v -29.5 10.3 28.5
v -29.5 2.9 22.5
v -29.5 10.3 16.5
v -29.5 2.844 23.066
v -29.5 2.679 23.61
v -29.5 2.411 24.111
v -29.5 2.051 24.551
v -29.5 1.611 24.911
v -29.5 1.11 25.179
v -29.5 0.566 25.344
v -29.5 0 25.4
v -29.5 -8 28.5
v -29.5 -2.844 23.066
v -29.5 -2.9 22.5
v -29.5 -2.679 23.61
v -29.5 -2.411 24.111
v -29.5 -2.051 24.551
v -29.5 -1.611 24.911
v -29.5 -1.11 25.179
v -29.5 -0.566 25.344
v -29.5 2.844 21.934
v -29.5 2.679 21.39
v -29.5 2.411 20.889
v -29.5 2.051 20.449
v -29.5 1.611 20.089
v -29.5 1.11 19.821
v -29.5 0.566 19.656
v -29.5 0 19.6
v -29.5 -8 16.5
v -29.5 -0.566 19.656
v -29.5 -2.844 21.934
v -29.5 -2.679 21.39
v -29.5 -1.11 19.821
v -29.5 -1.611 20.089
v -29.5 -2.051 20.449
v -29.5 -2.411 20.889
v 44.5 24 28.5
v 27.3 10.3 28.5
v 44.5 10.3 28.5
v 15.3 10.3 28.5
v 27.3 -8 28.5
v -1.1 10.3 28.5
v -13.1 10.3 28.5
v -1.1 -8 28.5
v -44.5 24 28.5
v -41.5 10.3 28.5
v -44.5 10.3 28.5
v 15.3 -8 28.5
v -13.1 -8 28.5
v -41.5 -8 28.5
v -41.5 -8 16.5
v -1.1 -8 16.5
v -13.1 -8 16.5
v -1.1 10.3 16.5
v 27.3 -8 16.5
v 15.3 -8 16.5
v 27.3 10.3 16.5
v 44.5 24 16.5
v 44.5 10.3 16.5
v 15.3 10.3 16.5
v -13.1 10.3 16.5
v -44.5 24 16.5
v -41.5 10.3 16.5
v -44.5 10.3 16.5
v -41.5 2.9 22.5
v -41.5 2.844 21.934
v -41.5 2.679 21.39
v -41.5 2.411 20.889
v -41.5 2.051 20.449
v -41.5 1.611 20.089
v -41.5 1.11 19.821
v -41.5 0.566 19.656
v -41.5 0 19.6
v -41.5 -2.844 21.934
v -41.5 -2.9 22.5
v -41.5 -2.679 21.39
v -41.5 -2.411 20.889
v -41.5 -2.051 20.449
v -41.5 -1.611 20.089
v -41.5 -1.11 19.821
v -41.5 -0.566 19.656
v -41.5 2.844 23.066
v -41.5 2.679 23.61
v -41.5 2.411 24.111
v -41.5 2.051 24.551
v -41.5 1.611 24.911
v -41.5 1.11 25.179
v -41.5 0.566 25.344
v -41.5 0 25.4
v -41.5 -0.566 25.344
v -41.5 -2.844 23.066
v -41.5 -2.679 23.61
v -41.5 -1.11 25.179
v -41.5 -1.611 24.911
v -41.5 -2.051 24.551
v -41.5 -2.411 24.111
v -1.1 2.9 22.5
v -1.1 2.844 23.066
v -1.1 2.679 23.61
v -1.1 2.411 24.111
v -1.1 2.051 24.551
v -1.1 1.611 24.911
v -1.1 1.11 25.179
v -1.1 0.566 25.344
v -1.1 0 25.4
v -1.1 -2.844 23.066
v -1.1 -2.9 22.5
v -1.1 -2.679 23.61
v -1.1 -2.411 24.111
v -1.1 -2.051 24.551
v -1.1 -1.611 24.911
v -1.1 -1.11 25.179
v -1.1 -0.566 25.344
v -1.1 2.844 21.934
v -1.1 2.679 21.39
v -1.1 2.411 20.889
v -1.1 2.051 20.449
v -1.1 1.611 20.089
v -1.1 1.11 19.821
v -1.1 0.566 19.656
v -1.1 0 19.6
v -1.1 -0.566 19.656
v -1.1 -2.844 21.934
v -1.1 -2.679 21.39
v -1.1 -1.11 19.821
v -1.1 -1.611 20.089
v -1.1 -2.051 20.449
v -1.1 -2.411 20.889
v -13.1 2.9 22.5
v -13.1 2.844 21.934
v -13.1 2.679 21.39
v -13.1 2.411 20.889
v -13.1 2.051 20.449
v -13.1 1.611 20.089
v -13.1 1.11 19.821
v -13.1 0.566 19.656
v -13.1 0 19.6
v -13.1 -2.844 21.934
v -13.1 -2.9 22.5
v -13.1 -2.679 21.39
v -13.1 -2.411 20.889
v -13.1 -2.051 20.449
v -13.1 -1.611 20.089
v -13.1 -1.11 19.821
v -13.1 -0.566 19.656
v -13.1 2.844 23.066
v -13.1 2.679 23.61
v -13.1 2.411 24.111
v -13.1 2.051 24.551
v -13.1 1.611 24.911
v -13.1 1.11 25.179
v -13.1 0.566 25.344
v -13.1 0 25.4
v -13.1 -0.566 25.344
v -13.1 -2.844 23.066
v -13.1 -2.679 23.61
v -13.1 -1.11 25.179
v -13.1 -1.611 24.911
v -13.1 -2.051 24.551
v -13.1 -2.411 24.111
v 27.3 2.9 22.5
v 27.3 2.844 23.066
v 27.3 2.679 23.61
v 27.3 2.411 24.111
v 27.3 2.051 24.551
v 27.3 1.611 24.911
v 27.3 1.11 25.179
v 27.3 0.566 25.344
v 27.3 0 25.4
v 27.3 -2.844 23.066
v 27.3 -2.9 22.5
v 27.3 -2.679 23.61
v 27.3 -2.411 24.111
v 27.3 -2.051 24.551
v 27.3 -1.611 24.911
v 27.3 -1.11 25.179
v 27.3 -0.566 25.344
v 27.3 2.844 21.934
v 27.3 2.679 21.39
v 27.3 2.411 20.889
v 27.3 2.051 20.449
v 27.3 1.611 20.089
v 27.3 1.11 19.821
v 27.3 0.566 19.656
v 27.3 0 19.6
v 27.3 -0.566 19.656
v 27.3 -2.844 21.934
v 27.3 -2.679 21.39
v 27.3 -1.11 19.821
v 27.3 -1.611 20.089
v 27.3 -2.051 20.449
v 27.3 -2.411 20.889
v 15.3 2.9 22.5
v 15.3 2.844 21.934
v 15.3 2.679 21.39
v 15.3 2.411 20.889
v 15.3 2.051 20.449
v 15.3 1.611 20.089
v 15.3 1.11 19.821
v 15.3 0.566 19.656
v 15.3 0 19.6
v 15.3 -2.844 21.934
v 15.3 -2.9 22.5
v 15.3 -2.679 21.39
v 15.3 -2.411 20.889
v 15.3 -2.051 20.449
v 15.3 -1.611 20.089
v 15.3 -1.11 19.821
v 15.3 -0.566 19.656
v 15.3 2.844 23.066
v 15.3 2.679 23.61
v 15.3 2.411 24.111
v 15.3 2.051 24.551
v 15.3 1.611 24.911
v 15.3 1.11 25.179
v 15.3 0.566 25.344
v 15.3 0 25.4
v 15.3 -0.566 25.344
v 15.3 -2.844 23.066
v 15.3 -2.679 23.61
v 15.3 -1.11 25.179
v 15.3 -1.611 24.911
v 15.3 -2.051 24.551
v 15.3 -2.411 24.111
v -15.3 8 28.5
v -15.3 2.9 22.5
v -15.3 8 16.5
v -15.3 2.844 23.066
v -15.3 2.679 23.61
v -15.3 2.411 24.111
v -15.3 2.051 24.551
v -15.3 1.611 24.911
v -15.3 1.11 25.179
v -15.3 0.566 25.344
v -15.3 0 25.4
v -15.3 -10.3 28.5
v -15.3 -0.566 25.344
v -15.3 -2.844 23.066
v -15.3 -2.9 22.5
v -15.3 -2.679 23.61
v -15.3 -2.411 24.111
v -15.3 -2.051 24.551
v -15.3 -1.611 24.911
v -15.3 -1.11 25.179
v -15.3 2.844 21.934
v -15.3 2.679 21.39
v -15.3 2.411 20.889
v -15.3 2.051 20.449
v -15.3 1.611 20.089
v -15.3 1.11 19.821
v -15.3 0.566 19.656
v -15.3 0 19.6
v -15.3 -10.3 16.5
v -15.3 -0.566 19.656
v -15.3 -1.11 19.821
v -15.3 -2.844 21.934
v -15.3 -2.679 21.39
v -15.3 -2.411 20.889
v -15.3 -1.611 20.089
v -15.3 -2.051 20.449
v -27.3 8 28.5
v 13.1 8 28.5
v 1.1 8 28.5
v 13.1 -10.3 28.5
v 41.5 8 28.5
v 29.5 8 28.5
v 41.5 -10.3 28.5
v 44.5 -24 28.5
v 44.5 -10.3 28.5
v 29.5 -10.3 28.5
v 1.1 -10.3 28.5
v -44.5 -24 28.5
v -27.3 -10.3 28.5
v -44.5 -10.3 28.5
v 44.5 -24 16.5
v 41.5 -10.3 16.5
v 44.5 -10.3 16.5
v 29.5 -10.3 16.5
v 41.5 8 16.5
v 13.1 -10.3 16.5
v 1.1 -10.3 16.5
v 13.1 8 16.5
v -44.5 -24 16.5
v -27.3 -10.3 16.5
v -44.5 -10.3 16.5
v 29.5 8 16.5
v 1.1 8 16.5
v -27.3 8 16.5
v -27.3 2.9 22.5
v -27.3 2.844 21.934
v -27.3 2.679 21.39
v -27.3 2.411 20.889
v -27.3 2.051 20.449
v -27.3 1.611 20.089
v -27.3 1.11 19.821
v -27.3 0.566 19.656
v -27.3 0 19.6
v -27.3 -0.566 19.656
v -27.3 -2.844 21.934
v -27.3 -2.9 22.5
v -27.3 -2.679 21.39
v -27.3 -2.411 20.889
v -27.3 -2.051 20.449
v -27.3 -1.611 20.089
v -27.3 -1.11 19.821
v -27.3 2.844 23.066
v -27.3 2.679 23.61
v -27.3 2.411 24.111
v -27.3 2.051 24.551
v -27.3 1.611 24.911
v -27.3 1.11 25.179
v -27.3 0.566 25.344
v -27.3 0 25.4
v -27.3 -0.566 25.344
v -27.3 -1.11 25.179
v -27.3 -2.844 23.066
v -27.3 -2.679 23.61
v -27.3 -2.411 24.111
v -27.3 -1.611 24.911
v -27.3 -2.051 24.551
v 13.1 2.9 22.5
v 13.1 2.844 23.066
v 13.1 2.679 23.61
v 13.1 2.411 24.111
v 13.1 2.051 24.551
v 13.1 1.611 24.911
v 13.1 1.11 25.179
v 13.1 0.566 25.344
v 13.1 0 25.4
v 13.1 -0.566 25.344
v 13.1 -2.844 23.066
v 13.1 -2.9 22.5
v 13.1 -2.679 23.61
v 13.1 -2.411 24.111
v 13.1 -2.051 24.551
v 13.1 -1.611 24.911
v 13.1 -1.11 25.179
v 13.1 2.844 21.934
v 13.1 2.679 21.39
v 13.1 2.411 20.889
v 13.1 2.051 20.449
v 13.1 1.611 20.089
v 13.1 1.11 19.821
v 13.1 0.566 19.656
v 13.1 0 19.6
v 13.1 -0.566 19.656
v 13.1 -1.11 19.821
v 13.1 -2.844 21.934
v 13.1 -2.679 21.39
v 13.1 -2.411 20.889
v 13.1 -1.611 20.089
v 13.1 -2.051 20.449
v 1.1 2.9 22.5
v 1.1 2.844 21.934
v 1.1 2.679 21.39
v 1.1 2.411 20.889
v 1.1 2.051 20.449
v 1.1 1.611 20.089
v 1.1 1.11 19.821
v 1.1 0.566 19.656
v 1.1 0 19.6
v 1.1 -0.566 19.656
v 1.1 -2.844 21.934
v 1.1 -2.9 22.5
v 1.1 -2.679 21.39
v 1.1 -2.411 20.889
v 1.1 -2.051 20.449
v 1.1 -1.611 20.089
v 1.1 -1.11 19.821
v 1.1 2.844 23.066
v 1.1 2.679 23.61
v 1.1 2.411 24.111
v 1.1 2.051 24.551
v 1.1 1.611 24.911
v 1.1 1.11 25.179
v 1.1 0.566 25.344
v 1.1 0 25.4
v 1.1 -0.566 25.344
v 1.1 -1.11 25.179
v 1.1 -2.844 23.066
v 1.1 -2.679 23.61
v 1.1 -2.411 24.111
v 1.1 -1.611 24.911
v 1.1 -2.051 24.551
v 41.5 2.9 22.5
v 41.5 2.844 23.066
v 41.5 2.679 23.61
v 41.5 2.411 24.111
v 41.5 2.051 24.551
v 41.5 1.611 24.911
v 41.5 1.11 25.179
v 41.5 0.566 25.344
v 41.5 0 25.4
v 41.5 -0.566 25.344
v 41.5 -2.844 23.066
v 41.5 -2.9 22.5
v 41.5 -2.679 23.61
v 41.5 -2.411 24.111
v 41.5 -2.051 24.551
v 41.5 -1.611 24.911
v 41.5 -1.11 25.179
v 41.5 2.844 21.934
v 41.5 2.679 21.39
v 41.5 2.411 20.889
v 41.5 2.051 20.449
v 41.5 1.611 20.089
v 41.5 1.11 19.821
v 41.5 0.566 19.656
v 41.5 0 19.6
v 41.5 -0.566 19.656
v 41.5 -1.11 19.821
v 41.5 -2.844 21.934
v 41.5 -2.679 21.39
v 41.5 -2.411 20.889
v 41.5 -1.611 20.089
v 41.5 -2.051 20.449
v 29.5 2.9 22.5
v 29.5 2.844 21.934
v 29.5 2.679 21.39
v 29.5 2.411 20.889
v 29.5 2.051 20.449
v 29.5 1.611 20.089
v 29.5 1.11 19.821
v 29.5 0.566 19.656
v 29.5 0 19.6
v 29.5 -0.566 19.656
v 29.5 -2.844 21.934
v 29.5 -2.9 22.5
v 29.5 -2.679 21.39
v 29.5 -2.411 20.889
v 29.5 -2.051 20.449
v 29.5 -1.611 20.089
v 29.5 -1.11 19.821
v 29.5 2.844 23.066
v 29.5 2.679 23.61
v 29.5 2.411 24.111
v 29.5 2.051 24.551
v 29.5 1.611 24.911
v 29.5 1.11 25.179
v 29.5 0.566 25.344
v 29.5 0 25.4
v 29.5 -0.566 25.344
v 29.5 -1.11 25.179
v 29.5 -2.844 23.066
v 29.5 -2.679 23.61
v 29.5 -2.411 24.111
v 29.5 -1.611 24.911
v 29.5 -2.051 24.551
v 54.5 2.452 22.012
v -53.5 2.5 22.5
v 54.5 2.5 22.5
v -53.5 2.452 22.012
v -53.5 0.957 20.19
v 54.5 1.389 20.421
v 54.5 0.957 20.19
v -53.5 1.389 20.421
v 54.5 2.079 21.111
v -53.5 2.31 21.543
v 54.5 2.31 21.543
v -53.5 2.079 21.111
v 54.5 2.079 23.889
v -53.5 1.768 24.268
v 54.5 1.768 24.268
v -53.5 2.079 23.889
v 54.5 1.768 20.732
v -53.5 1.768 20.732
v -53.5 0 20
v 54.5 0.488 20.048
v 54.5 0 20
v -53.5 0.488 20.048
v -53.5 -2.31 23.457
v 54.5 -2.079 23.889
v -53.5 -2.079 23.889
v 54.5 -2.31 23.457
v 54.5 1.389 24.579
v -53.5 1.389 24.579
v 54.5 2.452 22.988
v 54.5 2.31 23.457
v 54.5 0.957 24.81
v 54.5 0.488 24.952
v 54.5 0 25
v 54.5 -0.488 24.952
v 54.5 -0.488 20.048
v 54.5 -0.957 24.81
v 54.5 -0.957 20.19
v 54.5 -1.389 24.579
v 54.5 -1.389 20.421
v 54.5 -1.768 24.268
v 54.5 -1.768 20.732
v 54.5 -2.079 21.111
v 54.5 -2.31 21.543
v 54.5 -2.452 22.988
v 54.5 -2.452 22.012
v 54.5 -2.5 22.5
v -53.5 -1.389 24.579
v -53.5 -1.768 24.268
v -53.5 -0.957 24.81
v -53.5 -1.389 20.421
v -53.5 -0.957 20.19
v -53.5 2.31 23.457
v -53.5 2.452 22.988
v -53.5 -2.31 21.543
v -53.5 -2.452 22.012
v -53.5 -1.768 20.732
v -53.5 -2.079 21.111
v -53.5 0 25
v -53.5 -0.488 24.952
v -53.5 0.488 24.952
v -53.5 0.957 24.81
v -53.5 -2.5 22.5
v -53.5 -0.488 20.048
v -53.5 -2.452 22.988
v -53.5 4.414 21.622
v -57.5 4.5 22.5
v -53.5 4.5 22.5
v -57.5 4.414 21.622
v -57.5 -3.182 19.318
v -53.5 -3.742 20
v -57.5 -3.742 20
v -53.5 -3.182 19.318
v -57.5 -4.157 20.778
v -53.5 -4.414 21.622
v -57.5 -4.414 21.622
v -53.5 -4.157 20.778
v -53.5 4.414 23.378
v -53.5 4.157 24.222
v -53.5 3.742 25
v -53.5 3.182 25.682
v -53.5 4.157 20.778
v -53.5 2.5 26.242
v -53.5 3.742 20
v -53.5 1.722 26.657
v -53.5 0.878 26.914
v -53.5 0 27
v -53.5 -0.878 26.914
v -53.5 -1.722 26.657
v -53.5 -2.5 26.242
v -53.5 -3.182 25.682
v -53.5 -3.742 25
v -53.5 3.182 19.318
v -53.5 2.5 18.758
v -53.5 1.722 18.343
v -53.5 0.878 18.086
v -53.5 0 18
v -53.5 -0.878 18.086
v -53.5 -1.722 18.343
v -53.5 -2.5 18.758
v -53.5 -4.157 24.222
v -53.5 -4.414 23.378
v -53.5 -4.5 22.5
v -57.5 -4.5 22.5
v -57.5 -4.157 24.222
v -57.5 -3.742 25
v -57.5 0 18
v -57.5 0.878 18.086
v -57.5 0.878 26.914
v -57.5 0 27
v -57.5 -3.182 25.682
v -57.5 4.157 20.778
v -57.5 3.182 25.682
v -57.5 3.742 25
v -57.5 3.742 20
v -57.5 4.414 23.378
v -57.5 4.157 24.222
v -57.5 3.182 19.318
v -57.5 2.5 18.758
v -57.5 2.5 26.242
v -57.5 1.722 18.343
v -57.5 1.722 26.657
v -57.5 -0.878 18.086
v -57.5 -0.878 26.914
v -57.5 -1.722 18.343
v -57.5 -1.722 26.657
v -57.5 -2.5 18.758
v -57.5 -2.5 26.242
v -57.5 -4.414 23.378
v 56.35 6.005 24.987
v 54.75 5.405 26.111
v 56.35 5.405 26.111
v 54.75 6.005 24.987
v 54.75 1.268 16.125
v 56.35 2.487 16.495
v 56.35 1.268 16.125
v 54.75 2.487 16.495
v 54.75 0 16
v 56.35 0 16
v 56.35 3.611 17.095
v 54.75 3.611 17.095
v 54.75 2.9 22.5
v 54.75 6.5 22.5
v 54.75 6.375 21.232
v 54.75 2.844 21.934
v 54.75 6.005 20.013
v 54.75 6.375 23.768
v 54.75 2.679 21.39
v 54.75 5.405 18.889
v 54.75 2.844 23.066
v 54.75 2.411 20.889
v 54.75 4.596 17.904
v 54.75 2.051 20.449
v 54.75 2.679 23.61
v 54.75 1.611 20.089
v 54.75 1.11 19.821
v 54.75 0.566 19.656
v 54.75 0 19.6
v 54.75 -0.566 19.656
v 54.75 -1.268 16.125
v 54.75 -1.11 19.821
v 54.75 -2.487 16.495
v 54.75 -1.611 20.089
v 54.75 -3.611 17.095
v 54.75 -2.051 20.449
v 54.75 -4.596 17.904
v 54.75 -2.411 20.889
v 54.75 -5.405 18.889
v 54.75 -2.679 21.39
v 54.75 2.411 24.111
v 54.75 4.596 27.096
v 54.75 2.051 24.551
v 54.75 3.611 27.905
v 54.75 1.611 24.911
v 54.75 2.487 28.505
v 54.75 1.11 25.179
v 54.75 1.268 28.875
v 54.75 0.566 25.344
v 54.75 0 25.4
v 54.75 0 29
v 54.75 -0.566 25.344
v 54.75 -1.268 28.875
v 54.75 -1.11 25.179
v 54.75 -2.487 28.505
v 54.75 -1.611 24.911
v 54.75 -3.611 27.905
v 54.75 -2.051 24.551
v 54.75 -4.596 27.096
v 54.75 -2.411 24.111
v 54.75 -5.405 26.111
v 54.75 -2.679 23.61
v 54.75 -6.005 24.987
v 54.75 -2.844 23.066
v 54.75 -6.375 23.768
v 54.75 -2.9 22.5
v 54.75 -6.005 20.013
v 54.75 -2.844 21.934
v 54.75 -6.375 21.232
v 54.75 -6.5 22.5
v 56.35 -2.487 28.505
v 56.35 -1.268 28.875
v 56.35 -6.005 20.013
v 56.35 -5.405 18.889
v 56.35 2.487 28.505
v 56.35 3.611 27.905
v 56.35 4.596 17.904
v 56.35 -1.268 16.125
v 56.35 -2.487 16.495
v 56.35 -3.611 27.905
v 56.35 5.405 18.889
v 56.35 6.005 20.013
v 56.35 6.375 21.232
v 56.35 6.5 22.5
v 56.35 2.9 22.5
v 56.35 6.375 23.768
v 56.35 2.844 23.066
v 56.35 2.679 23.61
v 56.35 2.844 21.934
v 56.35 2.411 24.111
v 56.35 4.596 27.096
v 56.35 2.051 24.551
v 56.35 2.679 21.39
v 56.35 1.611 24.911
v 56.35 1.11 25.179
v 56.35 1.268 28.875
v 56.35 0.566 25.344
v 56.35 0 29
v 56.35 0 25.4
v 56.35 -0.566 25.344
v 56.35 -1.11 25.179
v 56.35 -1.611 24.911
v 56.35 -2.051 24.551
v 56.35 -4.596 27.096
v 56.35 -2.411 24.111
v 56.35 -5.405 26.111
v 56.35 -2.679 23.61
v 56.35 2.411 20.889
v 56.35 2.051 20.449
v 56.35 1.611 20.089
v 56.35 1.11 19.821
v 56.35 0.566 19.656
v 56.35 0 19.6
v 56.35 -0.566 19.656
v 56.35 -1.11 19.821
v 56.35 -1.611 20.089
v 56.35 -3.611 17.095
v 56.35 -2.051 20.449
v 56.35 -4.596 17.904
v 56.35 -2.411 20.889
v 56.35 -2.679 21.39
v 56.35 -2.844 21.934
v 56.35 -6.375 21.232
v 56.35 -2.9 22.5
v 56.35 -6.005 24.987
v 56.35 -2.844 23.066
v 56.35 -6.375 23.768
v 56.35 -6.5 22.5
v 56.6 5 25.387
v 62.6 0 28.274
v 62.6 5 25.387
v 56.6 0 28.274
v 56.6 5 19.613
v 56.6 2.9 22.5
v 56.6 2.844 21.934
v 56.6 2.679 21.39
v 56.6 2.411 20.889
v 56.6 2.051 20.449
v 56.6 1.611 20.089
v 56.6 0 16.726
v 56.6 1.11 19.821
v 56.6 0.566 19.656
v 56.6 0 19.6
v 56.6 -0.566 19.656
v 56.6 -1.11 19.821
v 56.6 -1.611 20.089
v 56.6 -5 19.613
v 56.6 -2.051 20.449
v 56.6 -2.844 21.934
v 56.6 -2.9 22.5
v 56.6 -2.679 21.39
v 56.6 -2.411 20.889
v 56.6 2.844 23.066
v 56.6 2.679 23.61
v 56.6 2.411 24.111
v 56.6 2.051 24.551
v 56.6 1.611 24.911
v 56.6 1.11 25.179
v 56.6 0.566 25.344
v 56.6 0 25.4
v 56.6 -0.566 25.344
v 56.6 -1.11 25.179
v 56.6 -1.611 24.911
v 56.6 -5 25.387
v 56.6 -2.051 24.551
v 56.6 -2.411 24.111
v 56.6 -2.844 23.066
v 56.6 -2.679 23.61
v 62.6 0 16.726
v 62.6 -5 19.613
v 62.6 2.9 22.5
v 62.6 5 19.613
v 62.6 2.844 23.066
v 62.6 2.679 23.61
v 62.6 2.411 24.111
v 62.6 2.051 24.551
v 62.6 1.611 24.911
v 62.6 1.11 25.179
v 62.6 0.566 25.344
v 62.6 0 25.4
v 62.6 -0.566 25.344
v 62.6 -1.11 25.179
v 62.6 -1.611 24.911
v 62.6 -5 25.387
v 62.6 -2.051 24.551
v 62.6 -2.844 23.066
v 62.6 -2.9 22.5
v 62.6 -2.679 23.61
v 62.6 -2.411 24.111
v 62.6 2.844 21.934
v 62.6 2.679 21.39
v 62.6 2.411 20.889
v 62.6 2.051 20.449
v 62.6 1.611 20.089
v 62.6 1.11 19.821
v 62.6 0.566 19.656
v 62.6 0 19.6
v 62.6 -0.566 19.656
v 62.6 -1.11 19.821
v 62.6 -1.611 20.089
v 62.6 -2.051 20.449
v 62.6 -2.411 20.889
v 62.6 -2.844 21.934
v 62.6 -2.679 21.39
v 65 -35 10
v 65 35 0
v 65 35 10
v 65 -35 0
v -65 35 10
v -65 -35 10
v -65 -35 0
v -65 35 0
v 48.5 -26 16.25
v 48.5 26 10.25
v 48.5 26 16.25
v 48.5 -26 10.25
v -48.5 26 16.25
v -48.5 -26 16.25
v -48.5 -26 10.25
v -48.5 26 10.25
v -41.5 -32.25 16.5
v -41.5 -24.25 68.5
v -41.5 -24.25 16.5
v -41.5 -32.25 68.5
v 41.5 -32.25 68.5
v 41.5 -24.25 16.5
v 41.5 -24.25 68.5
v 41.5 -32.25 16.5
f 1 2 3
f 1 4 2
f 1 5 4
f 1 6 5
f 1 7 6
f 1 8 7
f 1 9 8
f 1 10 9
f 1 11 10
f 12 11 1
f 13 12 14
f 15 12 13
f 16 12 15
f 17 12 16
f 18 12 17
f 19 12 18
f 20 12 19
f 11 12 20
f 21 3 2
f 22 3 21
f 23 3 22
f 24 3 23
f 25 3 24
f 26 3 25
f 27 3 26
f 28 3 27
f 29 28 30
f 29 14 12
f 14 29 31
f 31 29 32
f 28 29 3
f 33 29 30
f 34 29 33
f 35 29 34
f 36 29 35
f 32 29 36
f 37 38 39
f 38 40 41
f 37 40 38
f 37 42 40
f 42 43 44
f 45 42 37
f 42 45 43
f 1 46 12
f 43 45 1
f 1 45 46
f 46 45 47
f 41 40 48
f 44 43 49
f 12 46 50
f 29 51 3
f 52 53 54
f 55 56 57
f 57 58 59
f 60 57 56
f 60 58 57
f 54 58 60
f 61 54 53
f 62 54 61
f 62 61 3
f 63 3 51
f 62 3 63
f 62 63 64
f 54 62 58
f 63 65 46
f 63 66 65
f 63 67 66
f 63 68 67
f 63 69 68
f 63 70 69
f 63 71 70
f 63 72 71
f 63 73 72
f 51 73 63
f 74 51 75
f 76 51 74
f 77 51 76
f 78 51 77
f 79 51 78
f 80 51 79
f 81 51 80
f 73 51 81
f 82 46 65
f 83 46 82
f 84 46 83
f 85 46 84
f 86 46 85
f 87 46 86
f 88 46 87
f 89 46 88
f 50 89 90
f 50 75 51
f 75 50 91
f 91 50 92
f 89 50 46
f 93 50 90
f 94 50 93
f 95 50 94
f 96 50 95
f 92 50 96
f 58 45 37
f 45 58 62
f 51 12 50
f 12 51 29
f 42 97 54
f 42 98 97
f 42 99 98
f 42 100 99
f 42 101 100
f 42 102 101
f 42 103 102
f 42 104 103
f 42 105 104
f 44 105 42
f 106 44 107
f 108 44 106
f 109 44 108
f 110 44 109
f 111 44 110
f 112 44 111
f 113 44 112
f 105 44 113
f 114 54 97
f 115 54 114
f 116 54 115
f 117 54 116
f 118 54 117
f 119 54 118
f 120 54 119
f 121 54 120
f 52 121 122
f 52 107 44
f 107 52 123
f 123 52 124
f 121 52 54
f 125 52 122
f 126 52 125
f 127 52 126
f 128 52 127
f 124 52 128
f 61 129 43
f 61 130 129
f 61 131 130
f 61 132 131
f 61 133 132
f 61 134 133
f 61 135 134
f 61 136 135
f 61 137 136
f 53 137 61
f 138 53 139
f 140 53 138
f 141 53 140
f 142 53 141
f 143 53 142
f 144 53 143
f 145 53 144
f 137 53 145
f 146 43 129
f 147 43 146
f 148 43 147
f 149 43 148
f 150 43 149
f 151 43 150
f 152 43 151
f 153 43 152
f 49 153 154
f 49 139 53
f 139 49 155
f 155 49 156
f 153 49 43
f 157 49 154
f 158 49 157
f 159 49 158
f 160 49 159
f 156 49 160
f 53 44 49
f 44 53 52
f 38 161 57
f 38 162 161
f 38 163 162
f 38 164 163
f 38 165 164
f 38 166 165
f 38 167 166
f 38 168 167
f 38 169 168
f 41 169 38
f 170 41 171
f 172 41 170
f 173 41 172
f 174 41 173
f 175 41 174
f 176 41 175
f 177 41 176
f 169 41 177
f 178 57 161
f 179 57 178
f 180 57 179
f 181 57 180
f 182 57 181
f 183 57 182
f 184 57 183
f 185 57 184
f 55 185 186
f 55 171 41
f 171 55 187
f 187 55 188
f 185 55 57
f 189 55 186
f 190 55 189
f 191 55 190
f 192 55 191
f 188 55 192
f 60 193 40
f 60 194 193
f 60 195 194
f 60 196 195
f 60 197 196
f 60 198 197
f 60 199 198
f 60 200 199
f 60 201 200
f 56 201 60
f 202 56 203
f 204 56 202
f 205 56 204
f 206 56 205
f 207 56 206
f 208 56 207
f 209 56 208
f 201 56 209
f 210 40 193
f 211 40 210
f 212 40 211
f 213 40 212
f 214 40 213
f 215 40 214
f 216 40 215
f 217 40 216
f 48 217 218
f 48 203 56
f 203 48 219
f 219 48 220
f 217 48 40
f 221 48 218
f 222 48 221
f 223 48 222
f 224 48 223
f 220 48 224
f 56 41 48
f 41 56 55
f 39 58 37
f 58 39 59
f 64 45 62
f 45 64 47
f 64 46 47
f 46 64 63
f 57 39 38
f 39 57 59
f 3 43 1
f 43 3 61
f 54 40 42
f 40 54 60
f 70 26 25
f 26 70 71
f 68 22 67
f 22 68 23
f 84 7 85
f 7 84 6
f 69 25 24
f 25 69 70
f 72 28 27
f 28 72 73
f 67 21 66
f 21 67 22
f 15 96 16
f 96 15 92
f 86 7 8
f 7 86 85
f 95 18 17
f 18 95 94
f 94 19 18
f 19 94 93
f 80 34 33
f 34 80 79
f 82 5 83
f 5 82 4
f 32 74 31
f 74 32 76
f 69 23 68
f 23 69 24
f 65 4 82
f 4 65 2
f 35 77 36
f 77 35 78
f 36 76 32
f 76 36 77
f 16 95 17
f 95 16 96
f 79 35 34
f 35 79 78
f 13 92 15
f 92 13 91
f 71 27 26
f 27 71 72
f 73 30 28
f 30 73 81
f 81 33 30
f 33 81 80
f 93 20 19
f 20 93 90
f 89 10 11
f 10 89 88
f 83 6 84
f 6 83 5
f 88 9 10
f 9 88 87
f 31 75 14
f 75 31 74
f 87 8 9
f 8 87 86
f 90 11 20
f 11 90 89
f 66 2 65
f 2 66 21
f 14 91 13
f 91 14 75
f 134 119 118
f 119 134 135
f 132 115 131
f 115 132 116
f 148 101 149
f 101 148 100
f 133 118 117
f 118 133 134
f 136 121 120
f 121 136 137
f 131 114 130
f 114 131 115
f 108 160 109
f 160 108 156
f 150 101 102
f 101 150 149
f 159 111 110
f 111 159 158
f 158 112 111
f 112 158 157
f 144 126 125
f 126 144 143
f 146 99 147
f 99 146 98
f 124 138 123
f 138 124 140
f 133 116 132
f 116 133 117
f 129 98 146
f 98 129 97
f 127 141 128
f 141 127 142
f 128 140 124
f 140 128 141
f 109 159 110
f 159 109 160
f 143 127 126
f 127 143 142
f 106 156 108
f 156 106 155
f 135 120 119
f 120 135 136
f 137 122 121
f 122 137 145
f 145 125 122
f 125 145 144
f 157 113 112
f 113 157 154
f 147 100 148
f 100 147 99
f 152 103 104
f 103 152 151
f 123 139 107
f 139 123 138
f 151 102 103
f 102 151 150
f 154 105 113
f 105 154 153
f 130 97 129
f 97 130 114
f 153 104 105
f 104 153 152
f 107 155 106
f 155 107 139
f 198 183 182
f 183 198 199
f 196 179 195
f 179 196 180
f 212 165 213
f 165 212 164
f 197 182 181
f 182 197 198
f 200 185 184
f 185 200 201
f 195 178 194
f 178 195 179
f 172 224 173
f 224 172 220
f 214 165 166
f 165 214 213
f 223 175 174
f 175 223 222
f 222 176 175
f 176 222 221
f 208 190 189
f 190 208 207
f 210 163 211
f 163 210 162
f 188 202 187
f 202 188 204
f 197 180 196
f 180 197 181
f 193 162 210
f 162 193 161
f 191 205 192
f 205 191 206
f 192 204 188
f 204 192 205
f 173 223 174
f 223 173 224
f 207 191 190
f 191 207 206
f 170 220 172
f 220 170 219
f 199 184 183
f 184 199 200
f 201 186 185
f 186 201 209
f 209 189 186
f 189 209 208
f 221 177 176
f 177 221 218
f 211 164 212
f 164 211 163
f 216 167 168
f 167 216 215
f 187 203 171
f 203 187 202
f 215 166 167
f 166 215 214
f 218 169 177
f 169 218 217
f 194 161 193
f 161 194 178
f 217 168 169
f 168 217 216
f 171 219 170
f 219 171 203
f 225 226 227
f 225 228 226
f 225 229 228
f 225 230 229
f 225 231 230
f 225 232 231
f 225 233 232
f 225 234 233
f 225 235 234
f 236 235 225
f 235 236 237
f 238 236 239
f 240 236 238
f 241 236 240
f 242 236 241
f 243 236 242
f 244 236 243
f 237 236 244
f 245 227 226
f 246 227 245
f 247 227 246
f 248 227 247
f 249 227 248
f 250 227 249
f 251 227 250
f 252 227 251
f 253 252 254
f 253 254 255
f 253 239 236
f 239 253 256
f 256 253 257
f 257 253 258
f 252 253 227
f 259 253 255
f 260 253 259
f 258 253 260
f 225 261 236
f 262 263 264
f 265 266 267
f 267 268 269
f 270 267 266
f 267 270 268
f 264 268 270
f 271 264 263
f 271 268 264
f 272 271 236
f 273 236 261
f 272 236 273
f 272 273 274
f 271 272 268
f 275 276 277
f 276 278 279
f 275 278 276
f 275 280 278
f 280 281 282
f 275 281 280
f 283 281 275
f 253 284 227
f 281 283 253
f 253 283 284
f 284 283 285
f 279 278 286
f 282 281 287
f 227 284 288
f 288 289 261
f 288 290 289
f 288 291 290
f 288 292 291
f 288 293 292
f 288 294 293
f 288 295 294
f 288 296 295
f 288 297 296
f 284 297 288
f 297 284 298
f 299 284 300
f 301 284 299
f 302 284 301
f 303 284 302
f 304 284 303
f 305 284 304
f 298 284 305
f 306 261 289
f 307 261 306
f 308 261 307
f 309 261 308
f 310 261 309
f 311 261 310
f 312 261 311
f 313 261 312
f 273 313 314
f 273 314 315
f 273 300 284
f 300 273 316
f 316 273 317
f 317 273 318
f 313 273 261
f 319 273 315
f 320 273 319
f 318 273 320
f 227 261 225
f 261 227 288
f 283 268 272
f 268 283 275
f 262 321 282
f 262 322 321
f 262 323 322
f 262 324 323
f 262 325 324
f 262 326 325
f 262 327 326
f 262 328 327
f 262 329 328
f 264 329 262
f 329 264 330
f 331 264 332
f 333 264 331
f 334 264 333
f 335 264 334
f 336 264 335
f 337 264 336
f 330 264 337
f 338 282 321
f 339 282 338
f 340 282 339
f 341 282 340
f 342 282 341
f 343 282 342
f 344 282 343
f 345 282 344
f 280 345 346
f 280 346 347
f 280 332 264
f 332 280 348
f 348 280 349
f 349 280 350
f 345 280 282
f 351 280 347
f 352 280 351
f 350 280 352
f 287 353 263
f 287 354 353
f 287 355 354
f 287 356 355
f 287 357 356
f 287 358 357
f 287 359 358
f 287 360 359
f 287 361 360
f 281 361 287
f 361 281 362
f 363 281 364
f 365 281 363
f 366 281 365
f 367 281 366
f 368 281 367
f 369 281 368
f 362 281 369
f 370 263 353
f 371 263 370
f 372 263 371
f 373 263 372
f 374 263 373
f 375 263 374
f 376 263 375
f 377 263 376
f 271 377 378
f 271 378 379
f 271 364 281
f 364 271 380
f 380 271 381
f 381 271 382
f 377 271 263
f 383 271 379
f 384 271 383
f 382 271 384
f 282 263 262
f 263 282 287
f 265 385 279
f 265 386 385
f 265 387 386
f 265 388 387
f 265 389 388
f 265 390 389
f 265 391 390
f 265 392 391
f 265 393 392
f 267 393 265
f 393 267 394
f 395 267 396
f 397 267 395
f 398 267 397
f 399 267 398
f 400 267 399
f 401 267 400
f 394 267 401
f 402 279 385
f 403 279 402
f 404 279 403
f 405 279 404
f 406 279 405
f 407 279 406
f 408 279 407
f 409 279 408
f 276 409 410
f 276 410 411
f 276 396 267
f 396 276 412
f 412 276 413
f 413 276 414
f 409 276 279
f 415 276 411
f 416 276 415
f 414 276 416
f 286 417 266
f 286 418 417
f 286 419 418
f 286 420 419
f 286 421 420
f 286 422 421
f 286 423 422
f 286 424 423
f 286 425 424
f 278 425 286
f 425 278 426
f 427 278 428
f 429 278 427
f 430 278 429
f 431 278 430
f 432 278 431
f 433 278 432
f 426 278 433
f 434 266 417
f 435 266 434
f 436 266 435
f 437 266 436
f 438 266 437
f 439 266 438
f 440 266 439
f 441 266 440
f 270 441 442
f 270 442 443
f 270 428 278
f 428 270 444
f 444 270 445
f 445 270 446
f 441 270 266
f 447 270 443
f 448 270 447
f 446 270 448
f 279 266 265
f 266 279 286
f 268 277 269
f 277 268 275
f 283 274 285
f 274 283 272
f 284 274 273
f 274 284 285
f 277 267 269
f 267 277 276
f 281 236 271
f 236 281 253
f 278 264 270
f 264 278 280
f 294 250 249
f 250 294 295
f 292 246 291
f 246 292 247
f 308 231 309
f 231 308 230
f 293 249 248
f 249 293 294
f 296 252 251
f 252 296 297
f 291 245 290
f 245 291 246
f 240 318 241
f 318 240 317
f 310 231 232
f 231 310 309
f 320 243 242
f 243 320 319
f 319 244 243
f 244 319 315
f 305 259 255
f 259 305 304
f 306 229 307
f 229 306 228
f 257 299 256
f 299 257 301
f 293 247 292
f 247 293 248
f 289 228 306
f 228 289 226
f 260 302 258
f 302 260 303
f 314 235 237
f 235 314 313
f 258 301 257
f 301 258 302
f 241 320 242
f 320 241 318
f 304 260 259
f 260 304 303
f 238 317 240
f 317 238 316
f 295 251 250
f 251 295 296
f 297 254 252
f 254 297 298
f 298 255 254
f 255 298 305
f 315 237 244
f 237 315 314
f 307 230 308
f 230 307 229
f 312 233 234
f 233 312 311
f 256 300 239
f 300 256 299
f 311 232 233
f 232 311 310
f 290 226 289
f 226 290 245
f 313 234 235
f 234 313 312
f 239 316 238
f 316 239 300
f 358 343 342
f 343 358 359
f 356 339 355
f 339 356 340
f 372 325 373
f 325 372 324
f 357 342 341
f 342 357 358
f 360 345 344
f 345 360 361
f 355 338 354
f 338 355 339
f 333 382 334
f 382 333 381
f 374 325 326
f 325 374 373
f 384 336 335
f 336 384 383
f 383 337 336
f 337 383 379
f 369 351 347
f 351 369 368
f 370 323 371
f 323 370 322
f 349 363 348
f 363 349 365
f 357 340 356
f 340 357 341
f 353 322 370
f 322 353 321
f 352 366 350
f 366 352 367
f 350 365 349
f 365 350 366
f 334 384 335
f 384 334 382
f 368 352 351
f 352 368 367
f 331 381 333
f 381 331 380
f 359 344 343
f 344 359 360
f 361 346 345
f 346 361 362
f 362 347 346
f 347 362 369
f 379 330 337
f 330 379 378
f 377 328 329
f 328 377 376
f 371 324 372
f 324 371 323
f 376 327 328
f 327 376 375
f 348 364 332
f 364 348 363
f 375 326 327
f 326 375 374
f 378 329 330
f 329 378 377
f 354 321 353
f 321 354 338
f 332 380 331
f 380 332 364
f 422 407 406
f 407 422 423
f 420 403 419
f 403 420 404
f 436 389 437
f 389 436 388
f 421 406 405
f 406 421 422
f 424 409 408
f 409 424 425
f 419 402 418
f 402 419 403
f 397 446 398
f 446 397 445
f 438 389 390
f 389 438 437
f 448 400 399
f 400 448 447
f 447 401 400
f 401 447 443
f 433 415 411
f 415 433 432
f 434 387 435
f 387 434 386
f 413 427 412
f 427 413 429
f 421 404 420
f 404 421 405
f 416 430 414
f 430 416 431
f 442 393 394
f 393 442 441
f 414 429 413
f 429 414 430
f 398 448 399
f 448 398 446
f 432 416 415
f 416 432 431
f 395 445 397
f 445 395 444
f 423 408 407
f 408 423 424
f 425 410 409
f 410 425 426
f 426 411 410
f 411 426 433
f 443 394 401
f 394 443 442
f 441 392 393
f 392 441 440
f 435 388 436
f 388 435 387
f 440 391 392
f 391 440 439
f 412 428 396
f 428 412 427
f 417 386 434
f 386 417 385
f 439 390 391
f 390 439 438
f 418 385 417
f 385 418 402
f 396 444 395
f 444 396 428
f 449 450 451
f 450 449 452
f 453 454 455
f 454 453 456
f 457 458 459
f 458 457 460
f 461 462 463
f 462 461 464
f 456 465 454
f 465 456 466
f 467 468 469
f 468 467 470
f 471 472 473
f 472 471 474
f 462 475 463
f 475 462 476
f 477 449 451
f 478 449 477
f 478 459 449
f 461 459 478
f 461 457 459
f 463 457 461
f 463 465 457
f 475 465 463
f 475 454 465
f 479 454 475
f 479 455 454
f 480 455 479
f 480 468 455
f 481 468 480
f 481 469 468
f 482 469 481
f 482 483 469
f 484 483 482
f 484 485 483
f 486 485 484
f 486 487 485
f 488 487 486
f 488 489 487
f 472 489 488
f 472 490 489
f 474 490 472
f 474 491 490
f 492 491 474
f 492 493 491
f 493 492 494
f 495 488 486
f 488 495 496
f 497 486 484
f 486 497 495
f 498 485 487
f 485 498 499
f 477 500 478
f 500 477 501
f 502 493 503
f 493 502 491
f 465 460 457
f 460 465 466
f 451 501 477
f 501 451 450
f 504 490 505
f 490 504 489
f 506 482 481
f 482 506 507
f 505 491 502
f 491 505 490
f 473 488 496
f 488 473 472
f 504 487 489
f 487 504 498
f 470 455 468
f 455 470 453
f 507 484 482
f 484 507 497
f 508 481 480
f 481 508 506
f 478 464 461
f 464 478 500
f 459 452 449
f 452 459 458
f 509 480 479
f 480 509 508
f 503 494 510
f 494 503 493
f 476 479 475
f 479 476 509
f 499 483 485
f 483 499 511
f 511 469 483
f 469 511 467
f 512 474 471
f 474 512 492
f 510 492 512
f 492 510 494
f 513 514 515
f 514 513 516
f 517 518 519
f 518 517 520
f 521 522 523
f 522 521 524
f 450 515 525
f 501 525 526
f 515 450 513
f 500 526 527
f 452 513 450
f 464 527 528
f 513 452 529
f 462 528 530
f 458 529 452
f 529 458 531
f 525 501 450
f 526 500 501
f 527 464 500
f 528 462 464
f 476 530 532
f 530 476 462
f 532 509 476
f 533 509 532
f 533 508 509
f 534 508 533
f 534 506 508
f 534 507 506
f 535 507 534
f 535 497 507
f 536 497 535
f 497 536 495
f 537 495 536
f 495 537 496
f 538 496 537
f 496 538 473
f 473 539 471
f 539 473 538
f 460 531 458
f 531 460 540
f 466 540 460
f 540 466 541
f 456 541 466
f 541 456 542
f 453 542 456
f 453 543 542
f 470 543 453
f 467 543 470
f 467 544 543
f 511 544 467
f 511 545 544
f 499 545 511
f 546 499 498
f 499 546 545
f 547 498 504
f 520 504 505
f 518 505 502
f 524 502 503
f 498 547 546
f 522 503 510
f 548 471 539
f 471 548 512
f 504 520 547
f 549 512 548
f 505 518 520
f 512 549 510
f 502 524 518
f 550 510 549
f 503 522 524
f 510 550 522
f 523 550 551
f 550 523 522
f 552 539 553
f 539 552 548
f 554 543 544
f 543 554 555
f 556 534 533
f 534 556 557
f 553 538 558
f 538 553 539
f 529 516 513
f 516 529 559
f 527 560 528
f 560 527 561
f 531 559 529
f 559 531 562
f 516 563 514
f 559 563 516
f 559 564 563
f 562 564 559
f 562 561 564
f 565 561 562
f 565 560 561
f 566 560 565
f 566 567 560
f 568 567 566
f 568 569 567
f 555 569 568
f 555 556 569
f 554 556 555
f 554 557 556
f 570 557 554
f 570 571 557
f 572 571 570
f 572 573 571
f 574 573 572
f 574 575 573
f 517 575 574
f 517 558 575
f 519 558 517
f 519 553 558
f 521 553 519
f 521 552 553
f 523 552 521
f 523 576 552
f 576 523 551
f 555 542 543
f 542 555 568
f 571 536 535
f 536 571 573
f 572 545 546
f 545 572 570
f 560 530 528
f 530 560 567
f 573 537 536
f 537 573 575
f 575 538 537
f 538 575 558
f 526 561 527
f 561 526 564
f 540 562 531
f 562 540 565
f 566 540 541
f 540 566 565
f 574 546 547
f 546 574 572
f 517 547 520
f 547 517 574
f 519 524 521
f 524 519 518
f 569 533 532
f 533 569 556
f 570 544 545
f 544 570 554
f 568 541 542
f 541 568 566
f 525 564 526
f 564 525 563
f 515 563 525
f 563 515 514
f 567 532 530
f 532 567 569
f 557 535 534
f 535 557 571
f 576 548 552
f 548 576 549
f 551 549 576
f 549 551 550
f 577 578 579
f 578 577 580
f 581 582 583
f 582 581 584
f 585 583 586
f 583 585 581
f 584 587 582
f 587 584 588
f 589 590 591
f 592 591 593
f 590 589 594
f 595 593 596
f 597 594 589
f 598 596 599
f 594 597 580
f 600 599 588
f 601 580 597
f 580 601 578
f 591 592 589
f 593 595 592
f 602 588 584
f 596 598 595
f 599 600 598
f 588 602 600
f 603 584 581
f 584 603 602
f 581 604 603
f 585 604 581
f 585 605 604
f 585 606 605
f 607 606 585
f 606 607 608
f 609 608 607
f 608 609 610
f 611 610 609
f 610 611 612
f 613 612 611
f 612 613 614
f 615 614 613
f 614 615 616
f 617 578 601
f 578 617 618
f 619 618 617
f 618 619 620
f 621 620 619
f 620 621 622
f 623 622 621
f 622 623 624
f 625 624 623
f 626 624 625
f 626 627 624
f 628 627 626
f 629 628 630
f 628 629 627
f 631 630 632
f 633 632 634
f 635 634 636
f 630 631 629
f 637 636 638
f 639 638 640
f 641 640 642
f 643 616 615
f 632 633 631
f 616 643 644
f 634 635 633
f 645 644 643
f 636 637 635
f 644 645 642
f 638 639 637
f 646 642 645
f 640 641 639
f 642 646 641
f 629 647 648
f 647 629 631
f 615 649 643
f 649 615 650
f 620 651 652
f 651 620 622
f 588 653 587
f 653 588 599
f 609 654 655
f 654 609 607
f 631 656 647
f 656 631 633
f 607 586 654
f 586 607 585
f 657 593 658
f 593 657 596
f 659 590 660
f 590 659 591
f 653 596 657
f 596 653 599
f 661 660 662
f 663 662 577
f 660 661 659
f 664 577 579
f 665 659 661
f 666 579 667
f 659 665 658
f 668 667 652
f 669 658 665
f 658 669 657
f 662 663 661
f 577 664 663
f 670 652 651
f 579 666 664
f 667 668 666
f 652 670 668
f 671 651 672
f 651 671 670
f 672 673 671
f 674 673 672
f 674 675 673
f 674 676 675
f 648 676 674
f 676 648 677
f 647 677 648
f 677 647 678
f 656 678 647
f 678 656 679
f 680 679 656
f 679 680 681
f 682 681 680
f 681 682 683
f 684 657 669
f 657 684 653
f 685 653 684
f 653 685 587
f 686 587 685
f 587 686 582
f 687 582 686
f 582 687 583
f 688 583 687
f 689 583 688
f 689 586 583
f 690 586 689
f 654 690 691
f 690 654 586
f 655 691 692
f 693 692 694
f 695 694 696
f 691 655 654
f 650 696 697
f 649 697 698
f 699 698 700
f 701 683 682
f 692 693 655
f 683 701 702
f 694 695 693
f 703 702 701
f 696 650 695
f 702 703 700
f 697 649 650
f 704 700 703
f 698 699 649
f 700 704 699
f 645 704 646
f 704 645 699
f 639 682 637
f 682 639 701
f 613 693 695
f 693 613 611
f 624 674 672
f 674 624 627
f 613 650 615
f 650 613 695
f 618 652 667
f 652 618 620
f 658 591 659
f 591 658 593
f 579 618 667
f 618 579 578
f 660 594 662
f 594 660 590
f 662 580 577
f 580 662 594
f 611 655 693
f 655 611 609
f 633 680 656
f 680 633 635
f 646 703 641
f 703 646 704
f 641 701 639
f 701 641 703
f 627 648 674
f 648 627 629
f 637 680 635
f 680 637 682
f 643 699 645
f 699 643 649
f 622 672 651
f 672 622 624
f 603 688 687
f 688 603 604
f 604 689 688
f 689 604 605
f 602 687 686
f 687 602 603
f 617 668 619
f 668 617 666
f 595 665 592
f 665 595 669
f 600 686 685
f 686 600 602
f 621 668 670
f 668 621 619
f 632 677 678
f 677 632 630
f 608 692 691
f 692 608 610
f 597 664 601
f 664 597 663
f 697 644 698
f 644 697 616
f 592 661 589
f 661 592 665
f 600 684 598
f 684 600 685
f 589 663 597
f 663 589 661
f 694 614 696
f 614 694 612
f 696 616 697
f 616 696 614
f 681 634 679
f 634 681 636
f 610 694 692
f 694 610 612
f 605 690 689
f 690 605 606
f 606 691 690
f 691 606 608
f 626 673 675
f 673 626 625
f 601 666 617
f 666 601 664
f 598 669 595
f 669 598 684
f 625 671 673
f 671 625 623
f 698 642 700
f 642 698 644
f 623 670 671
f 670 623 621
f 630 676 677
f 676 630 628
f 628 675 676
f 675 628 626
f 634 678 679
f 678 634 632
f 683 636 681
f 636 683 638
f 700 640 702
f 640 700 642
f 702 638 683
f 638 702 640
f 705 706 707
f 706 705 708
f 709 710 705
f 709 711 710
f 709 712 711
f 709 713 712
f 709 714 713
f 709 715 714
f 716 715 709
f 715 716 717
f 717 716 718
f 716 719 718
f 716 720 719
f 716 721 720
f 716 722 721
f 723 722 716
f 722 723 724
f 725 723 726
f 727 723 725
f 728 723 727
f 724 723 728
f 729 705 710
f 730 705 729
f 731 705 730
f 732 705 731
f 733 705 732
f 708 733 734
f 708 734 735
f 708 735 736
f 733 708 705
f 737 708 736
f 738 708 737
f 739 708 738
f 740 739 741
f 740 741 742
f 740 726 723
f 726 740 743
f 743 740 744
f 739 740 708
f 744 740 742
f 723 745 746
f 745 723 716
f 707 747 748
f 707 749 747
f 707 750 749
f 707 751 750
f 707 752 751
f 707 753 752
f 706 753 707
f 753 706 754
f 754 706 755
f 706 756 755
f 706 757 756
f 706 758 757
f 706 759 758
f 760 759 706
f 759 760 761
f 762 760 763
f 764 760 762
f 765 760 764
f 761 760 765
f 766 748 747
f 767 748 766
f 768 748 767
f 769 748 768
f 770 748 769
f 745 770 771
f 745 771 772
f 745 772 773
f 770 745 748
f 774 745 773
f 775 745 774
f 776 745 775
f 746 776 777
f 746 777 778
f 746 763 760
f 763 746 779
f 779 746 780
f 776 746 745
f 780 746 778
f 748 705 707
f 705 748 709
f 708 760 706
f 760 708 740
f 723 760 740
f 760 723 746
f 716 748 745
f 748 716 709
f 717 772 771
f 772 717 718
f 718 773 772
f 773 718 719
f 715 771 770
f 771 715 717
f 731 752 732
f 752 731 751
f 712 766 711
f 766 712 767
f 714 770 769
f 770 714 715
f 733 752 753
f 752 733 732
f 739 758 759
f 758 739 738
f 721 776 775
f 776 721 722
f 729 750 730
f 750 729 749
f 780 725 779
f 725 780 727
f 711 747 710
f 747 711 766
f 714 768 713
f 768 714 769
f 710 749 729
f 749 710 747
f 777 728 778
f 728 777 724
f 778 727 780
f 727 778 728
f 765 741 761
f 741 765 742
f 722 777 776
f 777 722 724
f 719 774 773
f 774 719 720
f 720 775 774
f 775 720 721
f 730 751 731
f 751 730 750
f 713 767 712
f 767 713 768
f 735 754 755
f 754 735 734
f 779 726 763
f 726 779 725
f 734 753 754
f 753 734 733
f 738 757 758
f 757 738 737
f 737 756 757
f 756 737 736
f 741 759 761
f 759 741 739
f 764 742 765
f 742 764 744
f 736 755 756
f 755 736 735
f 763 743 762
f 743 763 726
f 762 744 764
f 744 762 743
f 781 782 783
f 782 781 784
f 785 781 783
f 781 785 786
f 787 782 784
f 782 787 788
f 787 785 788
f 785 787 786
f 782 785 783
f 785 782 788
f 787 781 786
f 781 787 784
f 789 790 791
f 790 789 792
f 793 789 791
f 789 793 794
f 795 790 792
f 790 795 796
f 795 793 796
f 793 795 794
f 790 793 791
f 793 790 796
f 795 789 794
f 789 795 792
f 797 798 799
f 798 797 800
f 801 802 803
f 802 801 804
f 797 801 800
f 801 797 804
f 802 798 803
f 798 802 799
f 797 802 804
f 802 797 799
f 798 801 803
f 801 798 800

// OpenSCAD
$fn = 32;

// ------------------------------------------------------------------------
// Comb hinge with flap: leaf 89 x 24 mm, pin d5, flap 52 mm
// Every part is its own module, assembly() places every instance.
// ------------------------------------------------------------------------

// --- part 1 ---
module hinge_bed() {
  difference() {
    translate([-65, -35, 0]) cube([130, 70, 10]);
  }
}

// --- part 2 ---
module hinge_riser() {
  difference() {
    translate([-48.5, -26, 0]) cube([97, 52, 6]);
  }
}

// --- part 3 ---
module hinge_leaf_a() {
  difference() {
    union() {
      translate([-41.5, -8, -6]) cube([12, 32, 12]);
      translate([-13.1, -8, -6]) cube([12, 32, 12]);
      translate([15.3, -8, -6]) cube([12, 32, 12]);
      translate([-44.5, 10.3, -6]) cube([89, 13.7, 12]);
    }
    translate([-35.5, 0, 0]) rotate([0, 90, 0]) cylinder(h = 14, d = 5.8, center = true);
    translate([-7.1, 0, 0]) rotate([0, 90, 0]) cylinder(h = 14, d = 5.8, center = true);
    translate([21.3, 0, 0]) rotate([0, 90, 0]) cylinder(h = 14, d = 5.8, center = true);
  }
}

// --- part 4 ---
module hinge_leaf_b() {
  difference() {
    union() {
      translate([-27.3, -24, -6]) cube([12, 32, 12]);
      translate([1.1, -24, -6]) cube([12, 32, 12]);
      translate([29.5, -24, -6]) cube([12, 32, 12]);
      translate([-44.5, -24, -6]) cube([89, 13.7, 12]);
    }
    translate([-21.3, 0, 0]) rotate([0, 90, 0]) cylinder(h = 14, d = 5.8, center = true);
    translate([7.1, 0, 0]) rotate([0, 90, 0]) cylinder(h = 14, d = 5.8, center = true);
    translate([35.5, 0, 0]) rotate([0, 90, 0]) cylinder(h = 14, d = 5.8, center = true);
  }
}

// --- part 5 ---
module hinge_flap() {
  difference() {
    translate([-41.5, -26, 0]) cube([83, 52, 8]);
  }
}

// --- part 6 ---
module hinge_pin() {
  rotate([0, 90, 0]) cylinder(h = 109, d = 5, center = true);
  translate([-57.5, 0, 0]) rotate([0, 90, 0]) cylinder(h = 4, d = 9);
}

// --- part 7 ---
module pin_washer() {
  difference() {
      translate([0, 0, 0]) cylinder(h = 1.6, d = 13);
      translate([0, 0, -1]) cylinder(h = 3.6, d = 5.8);
    }
}

// --- part 8 ---
module pin_nut() {
  difference() {
    linear_extrude(height = 6) polygon(points = [[5.774, 0], [2.887, 5], [-2.887, 5], [-5.774, 0], [-2.887, -5], [2.887, -5]]);
    translate([0, 0, -1]) cylinder(h = 8, d = 5.8);
  }
}

// --- assembly ---
module assembly() {
  color([0.80, 0.24, 0.20]) translate([0, 0, 0]) rotate([0, 0, 0]) hinge_bed();
  color([0.20, 0.45, 0.75]) translate([0, 0, 10.25]) rotate([0, 0, 0]) hinge_riser();
  color([0.25, 0.62, 0.32]) translate([0, 0, 22.5]) rotate([0, 0, 0]) hinge_leaf_a();
  color([0.92, 0.70, 0.18]) translate([0, 0, 22.5]) rotate([0, 0, 0]) hinge_leaf_b();
  color([0.58, 0.35, 0.70]) translate([0, -24.25, 42.5]) rotate([90, 0, 0]) hinge_flap();
  color([0.16, 0.66, 0.66]) translate([0, 0, 22.5]) rotate([0, 0, 0]) hinge_pin();
  color([0.85, 0.48, 0.18]) translate([54.75, 0, 22.5]) rotate([0, 90, 0]) pin_washer();
  color([0.55, 0.60, 0.65]) translate([56.6, 0, 22.5]) rotate([0, 90, 0]) pin_nut();
}

assembly();
